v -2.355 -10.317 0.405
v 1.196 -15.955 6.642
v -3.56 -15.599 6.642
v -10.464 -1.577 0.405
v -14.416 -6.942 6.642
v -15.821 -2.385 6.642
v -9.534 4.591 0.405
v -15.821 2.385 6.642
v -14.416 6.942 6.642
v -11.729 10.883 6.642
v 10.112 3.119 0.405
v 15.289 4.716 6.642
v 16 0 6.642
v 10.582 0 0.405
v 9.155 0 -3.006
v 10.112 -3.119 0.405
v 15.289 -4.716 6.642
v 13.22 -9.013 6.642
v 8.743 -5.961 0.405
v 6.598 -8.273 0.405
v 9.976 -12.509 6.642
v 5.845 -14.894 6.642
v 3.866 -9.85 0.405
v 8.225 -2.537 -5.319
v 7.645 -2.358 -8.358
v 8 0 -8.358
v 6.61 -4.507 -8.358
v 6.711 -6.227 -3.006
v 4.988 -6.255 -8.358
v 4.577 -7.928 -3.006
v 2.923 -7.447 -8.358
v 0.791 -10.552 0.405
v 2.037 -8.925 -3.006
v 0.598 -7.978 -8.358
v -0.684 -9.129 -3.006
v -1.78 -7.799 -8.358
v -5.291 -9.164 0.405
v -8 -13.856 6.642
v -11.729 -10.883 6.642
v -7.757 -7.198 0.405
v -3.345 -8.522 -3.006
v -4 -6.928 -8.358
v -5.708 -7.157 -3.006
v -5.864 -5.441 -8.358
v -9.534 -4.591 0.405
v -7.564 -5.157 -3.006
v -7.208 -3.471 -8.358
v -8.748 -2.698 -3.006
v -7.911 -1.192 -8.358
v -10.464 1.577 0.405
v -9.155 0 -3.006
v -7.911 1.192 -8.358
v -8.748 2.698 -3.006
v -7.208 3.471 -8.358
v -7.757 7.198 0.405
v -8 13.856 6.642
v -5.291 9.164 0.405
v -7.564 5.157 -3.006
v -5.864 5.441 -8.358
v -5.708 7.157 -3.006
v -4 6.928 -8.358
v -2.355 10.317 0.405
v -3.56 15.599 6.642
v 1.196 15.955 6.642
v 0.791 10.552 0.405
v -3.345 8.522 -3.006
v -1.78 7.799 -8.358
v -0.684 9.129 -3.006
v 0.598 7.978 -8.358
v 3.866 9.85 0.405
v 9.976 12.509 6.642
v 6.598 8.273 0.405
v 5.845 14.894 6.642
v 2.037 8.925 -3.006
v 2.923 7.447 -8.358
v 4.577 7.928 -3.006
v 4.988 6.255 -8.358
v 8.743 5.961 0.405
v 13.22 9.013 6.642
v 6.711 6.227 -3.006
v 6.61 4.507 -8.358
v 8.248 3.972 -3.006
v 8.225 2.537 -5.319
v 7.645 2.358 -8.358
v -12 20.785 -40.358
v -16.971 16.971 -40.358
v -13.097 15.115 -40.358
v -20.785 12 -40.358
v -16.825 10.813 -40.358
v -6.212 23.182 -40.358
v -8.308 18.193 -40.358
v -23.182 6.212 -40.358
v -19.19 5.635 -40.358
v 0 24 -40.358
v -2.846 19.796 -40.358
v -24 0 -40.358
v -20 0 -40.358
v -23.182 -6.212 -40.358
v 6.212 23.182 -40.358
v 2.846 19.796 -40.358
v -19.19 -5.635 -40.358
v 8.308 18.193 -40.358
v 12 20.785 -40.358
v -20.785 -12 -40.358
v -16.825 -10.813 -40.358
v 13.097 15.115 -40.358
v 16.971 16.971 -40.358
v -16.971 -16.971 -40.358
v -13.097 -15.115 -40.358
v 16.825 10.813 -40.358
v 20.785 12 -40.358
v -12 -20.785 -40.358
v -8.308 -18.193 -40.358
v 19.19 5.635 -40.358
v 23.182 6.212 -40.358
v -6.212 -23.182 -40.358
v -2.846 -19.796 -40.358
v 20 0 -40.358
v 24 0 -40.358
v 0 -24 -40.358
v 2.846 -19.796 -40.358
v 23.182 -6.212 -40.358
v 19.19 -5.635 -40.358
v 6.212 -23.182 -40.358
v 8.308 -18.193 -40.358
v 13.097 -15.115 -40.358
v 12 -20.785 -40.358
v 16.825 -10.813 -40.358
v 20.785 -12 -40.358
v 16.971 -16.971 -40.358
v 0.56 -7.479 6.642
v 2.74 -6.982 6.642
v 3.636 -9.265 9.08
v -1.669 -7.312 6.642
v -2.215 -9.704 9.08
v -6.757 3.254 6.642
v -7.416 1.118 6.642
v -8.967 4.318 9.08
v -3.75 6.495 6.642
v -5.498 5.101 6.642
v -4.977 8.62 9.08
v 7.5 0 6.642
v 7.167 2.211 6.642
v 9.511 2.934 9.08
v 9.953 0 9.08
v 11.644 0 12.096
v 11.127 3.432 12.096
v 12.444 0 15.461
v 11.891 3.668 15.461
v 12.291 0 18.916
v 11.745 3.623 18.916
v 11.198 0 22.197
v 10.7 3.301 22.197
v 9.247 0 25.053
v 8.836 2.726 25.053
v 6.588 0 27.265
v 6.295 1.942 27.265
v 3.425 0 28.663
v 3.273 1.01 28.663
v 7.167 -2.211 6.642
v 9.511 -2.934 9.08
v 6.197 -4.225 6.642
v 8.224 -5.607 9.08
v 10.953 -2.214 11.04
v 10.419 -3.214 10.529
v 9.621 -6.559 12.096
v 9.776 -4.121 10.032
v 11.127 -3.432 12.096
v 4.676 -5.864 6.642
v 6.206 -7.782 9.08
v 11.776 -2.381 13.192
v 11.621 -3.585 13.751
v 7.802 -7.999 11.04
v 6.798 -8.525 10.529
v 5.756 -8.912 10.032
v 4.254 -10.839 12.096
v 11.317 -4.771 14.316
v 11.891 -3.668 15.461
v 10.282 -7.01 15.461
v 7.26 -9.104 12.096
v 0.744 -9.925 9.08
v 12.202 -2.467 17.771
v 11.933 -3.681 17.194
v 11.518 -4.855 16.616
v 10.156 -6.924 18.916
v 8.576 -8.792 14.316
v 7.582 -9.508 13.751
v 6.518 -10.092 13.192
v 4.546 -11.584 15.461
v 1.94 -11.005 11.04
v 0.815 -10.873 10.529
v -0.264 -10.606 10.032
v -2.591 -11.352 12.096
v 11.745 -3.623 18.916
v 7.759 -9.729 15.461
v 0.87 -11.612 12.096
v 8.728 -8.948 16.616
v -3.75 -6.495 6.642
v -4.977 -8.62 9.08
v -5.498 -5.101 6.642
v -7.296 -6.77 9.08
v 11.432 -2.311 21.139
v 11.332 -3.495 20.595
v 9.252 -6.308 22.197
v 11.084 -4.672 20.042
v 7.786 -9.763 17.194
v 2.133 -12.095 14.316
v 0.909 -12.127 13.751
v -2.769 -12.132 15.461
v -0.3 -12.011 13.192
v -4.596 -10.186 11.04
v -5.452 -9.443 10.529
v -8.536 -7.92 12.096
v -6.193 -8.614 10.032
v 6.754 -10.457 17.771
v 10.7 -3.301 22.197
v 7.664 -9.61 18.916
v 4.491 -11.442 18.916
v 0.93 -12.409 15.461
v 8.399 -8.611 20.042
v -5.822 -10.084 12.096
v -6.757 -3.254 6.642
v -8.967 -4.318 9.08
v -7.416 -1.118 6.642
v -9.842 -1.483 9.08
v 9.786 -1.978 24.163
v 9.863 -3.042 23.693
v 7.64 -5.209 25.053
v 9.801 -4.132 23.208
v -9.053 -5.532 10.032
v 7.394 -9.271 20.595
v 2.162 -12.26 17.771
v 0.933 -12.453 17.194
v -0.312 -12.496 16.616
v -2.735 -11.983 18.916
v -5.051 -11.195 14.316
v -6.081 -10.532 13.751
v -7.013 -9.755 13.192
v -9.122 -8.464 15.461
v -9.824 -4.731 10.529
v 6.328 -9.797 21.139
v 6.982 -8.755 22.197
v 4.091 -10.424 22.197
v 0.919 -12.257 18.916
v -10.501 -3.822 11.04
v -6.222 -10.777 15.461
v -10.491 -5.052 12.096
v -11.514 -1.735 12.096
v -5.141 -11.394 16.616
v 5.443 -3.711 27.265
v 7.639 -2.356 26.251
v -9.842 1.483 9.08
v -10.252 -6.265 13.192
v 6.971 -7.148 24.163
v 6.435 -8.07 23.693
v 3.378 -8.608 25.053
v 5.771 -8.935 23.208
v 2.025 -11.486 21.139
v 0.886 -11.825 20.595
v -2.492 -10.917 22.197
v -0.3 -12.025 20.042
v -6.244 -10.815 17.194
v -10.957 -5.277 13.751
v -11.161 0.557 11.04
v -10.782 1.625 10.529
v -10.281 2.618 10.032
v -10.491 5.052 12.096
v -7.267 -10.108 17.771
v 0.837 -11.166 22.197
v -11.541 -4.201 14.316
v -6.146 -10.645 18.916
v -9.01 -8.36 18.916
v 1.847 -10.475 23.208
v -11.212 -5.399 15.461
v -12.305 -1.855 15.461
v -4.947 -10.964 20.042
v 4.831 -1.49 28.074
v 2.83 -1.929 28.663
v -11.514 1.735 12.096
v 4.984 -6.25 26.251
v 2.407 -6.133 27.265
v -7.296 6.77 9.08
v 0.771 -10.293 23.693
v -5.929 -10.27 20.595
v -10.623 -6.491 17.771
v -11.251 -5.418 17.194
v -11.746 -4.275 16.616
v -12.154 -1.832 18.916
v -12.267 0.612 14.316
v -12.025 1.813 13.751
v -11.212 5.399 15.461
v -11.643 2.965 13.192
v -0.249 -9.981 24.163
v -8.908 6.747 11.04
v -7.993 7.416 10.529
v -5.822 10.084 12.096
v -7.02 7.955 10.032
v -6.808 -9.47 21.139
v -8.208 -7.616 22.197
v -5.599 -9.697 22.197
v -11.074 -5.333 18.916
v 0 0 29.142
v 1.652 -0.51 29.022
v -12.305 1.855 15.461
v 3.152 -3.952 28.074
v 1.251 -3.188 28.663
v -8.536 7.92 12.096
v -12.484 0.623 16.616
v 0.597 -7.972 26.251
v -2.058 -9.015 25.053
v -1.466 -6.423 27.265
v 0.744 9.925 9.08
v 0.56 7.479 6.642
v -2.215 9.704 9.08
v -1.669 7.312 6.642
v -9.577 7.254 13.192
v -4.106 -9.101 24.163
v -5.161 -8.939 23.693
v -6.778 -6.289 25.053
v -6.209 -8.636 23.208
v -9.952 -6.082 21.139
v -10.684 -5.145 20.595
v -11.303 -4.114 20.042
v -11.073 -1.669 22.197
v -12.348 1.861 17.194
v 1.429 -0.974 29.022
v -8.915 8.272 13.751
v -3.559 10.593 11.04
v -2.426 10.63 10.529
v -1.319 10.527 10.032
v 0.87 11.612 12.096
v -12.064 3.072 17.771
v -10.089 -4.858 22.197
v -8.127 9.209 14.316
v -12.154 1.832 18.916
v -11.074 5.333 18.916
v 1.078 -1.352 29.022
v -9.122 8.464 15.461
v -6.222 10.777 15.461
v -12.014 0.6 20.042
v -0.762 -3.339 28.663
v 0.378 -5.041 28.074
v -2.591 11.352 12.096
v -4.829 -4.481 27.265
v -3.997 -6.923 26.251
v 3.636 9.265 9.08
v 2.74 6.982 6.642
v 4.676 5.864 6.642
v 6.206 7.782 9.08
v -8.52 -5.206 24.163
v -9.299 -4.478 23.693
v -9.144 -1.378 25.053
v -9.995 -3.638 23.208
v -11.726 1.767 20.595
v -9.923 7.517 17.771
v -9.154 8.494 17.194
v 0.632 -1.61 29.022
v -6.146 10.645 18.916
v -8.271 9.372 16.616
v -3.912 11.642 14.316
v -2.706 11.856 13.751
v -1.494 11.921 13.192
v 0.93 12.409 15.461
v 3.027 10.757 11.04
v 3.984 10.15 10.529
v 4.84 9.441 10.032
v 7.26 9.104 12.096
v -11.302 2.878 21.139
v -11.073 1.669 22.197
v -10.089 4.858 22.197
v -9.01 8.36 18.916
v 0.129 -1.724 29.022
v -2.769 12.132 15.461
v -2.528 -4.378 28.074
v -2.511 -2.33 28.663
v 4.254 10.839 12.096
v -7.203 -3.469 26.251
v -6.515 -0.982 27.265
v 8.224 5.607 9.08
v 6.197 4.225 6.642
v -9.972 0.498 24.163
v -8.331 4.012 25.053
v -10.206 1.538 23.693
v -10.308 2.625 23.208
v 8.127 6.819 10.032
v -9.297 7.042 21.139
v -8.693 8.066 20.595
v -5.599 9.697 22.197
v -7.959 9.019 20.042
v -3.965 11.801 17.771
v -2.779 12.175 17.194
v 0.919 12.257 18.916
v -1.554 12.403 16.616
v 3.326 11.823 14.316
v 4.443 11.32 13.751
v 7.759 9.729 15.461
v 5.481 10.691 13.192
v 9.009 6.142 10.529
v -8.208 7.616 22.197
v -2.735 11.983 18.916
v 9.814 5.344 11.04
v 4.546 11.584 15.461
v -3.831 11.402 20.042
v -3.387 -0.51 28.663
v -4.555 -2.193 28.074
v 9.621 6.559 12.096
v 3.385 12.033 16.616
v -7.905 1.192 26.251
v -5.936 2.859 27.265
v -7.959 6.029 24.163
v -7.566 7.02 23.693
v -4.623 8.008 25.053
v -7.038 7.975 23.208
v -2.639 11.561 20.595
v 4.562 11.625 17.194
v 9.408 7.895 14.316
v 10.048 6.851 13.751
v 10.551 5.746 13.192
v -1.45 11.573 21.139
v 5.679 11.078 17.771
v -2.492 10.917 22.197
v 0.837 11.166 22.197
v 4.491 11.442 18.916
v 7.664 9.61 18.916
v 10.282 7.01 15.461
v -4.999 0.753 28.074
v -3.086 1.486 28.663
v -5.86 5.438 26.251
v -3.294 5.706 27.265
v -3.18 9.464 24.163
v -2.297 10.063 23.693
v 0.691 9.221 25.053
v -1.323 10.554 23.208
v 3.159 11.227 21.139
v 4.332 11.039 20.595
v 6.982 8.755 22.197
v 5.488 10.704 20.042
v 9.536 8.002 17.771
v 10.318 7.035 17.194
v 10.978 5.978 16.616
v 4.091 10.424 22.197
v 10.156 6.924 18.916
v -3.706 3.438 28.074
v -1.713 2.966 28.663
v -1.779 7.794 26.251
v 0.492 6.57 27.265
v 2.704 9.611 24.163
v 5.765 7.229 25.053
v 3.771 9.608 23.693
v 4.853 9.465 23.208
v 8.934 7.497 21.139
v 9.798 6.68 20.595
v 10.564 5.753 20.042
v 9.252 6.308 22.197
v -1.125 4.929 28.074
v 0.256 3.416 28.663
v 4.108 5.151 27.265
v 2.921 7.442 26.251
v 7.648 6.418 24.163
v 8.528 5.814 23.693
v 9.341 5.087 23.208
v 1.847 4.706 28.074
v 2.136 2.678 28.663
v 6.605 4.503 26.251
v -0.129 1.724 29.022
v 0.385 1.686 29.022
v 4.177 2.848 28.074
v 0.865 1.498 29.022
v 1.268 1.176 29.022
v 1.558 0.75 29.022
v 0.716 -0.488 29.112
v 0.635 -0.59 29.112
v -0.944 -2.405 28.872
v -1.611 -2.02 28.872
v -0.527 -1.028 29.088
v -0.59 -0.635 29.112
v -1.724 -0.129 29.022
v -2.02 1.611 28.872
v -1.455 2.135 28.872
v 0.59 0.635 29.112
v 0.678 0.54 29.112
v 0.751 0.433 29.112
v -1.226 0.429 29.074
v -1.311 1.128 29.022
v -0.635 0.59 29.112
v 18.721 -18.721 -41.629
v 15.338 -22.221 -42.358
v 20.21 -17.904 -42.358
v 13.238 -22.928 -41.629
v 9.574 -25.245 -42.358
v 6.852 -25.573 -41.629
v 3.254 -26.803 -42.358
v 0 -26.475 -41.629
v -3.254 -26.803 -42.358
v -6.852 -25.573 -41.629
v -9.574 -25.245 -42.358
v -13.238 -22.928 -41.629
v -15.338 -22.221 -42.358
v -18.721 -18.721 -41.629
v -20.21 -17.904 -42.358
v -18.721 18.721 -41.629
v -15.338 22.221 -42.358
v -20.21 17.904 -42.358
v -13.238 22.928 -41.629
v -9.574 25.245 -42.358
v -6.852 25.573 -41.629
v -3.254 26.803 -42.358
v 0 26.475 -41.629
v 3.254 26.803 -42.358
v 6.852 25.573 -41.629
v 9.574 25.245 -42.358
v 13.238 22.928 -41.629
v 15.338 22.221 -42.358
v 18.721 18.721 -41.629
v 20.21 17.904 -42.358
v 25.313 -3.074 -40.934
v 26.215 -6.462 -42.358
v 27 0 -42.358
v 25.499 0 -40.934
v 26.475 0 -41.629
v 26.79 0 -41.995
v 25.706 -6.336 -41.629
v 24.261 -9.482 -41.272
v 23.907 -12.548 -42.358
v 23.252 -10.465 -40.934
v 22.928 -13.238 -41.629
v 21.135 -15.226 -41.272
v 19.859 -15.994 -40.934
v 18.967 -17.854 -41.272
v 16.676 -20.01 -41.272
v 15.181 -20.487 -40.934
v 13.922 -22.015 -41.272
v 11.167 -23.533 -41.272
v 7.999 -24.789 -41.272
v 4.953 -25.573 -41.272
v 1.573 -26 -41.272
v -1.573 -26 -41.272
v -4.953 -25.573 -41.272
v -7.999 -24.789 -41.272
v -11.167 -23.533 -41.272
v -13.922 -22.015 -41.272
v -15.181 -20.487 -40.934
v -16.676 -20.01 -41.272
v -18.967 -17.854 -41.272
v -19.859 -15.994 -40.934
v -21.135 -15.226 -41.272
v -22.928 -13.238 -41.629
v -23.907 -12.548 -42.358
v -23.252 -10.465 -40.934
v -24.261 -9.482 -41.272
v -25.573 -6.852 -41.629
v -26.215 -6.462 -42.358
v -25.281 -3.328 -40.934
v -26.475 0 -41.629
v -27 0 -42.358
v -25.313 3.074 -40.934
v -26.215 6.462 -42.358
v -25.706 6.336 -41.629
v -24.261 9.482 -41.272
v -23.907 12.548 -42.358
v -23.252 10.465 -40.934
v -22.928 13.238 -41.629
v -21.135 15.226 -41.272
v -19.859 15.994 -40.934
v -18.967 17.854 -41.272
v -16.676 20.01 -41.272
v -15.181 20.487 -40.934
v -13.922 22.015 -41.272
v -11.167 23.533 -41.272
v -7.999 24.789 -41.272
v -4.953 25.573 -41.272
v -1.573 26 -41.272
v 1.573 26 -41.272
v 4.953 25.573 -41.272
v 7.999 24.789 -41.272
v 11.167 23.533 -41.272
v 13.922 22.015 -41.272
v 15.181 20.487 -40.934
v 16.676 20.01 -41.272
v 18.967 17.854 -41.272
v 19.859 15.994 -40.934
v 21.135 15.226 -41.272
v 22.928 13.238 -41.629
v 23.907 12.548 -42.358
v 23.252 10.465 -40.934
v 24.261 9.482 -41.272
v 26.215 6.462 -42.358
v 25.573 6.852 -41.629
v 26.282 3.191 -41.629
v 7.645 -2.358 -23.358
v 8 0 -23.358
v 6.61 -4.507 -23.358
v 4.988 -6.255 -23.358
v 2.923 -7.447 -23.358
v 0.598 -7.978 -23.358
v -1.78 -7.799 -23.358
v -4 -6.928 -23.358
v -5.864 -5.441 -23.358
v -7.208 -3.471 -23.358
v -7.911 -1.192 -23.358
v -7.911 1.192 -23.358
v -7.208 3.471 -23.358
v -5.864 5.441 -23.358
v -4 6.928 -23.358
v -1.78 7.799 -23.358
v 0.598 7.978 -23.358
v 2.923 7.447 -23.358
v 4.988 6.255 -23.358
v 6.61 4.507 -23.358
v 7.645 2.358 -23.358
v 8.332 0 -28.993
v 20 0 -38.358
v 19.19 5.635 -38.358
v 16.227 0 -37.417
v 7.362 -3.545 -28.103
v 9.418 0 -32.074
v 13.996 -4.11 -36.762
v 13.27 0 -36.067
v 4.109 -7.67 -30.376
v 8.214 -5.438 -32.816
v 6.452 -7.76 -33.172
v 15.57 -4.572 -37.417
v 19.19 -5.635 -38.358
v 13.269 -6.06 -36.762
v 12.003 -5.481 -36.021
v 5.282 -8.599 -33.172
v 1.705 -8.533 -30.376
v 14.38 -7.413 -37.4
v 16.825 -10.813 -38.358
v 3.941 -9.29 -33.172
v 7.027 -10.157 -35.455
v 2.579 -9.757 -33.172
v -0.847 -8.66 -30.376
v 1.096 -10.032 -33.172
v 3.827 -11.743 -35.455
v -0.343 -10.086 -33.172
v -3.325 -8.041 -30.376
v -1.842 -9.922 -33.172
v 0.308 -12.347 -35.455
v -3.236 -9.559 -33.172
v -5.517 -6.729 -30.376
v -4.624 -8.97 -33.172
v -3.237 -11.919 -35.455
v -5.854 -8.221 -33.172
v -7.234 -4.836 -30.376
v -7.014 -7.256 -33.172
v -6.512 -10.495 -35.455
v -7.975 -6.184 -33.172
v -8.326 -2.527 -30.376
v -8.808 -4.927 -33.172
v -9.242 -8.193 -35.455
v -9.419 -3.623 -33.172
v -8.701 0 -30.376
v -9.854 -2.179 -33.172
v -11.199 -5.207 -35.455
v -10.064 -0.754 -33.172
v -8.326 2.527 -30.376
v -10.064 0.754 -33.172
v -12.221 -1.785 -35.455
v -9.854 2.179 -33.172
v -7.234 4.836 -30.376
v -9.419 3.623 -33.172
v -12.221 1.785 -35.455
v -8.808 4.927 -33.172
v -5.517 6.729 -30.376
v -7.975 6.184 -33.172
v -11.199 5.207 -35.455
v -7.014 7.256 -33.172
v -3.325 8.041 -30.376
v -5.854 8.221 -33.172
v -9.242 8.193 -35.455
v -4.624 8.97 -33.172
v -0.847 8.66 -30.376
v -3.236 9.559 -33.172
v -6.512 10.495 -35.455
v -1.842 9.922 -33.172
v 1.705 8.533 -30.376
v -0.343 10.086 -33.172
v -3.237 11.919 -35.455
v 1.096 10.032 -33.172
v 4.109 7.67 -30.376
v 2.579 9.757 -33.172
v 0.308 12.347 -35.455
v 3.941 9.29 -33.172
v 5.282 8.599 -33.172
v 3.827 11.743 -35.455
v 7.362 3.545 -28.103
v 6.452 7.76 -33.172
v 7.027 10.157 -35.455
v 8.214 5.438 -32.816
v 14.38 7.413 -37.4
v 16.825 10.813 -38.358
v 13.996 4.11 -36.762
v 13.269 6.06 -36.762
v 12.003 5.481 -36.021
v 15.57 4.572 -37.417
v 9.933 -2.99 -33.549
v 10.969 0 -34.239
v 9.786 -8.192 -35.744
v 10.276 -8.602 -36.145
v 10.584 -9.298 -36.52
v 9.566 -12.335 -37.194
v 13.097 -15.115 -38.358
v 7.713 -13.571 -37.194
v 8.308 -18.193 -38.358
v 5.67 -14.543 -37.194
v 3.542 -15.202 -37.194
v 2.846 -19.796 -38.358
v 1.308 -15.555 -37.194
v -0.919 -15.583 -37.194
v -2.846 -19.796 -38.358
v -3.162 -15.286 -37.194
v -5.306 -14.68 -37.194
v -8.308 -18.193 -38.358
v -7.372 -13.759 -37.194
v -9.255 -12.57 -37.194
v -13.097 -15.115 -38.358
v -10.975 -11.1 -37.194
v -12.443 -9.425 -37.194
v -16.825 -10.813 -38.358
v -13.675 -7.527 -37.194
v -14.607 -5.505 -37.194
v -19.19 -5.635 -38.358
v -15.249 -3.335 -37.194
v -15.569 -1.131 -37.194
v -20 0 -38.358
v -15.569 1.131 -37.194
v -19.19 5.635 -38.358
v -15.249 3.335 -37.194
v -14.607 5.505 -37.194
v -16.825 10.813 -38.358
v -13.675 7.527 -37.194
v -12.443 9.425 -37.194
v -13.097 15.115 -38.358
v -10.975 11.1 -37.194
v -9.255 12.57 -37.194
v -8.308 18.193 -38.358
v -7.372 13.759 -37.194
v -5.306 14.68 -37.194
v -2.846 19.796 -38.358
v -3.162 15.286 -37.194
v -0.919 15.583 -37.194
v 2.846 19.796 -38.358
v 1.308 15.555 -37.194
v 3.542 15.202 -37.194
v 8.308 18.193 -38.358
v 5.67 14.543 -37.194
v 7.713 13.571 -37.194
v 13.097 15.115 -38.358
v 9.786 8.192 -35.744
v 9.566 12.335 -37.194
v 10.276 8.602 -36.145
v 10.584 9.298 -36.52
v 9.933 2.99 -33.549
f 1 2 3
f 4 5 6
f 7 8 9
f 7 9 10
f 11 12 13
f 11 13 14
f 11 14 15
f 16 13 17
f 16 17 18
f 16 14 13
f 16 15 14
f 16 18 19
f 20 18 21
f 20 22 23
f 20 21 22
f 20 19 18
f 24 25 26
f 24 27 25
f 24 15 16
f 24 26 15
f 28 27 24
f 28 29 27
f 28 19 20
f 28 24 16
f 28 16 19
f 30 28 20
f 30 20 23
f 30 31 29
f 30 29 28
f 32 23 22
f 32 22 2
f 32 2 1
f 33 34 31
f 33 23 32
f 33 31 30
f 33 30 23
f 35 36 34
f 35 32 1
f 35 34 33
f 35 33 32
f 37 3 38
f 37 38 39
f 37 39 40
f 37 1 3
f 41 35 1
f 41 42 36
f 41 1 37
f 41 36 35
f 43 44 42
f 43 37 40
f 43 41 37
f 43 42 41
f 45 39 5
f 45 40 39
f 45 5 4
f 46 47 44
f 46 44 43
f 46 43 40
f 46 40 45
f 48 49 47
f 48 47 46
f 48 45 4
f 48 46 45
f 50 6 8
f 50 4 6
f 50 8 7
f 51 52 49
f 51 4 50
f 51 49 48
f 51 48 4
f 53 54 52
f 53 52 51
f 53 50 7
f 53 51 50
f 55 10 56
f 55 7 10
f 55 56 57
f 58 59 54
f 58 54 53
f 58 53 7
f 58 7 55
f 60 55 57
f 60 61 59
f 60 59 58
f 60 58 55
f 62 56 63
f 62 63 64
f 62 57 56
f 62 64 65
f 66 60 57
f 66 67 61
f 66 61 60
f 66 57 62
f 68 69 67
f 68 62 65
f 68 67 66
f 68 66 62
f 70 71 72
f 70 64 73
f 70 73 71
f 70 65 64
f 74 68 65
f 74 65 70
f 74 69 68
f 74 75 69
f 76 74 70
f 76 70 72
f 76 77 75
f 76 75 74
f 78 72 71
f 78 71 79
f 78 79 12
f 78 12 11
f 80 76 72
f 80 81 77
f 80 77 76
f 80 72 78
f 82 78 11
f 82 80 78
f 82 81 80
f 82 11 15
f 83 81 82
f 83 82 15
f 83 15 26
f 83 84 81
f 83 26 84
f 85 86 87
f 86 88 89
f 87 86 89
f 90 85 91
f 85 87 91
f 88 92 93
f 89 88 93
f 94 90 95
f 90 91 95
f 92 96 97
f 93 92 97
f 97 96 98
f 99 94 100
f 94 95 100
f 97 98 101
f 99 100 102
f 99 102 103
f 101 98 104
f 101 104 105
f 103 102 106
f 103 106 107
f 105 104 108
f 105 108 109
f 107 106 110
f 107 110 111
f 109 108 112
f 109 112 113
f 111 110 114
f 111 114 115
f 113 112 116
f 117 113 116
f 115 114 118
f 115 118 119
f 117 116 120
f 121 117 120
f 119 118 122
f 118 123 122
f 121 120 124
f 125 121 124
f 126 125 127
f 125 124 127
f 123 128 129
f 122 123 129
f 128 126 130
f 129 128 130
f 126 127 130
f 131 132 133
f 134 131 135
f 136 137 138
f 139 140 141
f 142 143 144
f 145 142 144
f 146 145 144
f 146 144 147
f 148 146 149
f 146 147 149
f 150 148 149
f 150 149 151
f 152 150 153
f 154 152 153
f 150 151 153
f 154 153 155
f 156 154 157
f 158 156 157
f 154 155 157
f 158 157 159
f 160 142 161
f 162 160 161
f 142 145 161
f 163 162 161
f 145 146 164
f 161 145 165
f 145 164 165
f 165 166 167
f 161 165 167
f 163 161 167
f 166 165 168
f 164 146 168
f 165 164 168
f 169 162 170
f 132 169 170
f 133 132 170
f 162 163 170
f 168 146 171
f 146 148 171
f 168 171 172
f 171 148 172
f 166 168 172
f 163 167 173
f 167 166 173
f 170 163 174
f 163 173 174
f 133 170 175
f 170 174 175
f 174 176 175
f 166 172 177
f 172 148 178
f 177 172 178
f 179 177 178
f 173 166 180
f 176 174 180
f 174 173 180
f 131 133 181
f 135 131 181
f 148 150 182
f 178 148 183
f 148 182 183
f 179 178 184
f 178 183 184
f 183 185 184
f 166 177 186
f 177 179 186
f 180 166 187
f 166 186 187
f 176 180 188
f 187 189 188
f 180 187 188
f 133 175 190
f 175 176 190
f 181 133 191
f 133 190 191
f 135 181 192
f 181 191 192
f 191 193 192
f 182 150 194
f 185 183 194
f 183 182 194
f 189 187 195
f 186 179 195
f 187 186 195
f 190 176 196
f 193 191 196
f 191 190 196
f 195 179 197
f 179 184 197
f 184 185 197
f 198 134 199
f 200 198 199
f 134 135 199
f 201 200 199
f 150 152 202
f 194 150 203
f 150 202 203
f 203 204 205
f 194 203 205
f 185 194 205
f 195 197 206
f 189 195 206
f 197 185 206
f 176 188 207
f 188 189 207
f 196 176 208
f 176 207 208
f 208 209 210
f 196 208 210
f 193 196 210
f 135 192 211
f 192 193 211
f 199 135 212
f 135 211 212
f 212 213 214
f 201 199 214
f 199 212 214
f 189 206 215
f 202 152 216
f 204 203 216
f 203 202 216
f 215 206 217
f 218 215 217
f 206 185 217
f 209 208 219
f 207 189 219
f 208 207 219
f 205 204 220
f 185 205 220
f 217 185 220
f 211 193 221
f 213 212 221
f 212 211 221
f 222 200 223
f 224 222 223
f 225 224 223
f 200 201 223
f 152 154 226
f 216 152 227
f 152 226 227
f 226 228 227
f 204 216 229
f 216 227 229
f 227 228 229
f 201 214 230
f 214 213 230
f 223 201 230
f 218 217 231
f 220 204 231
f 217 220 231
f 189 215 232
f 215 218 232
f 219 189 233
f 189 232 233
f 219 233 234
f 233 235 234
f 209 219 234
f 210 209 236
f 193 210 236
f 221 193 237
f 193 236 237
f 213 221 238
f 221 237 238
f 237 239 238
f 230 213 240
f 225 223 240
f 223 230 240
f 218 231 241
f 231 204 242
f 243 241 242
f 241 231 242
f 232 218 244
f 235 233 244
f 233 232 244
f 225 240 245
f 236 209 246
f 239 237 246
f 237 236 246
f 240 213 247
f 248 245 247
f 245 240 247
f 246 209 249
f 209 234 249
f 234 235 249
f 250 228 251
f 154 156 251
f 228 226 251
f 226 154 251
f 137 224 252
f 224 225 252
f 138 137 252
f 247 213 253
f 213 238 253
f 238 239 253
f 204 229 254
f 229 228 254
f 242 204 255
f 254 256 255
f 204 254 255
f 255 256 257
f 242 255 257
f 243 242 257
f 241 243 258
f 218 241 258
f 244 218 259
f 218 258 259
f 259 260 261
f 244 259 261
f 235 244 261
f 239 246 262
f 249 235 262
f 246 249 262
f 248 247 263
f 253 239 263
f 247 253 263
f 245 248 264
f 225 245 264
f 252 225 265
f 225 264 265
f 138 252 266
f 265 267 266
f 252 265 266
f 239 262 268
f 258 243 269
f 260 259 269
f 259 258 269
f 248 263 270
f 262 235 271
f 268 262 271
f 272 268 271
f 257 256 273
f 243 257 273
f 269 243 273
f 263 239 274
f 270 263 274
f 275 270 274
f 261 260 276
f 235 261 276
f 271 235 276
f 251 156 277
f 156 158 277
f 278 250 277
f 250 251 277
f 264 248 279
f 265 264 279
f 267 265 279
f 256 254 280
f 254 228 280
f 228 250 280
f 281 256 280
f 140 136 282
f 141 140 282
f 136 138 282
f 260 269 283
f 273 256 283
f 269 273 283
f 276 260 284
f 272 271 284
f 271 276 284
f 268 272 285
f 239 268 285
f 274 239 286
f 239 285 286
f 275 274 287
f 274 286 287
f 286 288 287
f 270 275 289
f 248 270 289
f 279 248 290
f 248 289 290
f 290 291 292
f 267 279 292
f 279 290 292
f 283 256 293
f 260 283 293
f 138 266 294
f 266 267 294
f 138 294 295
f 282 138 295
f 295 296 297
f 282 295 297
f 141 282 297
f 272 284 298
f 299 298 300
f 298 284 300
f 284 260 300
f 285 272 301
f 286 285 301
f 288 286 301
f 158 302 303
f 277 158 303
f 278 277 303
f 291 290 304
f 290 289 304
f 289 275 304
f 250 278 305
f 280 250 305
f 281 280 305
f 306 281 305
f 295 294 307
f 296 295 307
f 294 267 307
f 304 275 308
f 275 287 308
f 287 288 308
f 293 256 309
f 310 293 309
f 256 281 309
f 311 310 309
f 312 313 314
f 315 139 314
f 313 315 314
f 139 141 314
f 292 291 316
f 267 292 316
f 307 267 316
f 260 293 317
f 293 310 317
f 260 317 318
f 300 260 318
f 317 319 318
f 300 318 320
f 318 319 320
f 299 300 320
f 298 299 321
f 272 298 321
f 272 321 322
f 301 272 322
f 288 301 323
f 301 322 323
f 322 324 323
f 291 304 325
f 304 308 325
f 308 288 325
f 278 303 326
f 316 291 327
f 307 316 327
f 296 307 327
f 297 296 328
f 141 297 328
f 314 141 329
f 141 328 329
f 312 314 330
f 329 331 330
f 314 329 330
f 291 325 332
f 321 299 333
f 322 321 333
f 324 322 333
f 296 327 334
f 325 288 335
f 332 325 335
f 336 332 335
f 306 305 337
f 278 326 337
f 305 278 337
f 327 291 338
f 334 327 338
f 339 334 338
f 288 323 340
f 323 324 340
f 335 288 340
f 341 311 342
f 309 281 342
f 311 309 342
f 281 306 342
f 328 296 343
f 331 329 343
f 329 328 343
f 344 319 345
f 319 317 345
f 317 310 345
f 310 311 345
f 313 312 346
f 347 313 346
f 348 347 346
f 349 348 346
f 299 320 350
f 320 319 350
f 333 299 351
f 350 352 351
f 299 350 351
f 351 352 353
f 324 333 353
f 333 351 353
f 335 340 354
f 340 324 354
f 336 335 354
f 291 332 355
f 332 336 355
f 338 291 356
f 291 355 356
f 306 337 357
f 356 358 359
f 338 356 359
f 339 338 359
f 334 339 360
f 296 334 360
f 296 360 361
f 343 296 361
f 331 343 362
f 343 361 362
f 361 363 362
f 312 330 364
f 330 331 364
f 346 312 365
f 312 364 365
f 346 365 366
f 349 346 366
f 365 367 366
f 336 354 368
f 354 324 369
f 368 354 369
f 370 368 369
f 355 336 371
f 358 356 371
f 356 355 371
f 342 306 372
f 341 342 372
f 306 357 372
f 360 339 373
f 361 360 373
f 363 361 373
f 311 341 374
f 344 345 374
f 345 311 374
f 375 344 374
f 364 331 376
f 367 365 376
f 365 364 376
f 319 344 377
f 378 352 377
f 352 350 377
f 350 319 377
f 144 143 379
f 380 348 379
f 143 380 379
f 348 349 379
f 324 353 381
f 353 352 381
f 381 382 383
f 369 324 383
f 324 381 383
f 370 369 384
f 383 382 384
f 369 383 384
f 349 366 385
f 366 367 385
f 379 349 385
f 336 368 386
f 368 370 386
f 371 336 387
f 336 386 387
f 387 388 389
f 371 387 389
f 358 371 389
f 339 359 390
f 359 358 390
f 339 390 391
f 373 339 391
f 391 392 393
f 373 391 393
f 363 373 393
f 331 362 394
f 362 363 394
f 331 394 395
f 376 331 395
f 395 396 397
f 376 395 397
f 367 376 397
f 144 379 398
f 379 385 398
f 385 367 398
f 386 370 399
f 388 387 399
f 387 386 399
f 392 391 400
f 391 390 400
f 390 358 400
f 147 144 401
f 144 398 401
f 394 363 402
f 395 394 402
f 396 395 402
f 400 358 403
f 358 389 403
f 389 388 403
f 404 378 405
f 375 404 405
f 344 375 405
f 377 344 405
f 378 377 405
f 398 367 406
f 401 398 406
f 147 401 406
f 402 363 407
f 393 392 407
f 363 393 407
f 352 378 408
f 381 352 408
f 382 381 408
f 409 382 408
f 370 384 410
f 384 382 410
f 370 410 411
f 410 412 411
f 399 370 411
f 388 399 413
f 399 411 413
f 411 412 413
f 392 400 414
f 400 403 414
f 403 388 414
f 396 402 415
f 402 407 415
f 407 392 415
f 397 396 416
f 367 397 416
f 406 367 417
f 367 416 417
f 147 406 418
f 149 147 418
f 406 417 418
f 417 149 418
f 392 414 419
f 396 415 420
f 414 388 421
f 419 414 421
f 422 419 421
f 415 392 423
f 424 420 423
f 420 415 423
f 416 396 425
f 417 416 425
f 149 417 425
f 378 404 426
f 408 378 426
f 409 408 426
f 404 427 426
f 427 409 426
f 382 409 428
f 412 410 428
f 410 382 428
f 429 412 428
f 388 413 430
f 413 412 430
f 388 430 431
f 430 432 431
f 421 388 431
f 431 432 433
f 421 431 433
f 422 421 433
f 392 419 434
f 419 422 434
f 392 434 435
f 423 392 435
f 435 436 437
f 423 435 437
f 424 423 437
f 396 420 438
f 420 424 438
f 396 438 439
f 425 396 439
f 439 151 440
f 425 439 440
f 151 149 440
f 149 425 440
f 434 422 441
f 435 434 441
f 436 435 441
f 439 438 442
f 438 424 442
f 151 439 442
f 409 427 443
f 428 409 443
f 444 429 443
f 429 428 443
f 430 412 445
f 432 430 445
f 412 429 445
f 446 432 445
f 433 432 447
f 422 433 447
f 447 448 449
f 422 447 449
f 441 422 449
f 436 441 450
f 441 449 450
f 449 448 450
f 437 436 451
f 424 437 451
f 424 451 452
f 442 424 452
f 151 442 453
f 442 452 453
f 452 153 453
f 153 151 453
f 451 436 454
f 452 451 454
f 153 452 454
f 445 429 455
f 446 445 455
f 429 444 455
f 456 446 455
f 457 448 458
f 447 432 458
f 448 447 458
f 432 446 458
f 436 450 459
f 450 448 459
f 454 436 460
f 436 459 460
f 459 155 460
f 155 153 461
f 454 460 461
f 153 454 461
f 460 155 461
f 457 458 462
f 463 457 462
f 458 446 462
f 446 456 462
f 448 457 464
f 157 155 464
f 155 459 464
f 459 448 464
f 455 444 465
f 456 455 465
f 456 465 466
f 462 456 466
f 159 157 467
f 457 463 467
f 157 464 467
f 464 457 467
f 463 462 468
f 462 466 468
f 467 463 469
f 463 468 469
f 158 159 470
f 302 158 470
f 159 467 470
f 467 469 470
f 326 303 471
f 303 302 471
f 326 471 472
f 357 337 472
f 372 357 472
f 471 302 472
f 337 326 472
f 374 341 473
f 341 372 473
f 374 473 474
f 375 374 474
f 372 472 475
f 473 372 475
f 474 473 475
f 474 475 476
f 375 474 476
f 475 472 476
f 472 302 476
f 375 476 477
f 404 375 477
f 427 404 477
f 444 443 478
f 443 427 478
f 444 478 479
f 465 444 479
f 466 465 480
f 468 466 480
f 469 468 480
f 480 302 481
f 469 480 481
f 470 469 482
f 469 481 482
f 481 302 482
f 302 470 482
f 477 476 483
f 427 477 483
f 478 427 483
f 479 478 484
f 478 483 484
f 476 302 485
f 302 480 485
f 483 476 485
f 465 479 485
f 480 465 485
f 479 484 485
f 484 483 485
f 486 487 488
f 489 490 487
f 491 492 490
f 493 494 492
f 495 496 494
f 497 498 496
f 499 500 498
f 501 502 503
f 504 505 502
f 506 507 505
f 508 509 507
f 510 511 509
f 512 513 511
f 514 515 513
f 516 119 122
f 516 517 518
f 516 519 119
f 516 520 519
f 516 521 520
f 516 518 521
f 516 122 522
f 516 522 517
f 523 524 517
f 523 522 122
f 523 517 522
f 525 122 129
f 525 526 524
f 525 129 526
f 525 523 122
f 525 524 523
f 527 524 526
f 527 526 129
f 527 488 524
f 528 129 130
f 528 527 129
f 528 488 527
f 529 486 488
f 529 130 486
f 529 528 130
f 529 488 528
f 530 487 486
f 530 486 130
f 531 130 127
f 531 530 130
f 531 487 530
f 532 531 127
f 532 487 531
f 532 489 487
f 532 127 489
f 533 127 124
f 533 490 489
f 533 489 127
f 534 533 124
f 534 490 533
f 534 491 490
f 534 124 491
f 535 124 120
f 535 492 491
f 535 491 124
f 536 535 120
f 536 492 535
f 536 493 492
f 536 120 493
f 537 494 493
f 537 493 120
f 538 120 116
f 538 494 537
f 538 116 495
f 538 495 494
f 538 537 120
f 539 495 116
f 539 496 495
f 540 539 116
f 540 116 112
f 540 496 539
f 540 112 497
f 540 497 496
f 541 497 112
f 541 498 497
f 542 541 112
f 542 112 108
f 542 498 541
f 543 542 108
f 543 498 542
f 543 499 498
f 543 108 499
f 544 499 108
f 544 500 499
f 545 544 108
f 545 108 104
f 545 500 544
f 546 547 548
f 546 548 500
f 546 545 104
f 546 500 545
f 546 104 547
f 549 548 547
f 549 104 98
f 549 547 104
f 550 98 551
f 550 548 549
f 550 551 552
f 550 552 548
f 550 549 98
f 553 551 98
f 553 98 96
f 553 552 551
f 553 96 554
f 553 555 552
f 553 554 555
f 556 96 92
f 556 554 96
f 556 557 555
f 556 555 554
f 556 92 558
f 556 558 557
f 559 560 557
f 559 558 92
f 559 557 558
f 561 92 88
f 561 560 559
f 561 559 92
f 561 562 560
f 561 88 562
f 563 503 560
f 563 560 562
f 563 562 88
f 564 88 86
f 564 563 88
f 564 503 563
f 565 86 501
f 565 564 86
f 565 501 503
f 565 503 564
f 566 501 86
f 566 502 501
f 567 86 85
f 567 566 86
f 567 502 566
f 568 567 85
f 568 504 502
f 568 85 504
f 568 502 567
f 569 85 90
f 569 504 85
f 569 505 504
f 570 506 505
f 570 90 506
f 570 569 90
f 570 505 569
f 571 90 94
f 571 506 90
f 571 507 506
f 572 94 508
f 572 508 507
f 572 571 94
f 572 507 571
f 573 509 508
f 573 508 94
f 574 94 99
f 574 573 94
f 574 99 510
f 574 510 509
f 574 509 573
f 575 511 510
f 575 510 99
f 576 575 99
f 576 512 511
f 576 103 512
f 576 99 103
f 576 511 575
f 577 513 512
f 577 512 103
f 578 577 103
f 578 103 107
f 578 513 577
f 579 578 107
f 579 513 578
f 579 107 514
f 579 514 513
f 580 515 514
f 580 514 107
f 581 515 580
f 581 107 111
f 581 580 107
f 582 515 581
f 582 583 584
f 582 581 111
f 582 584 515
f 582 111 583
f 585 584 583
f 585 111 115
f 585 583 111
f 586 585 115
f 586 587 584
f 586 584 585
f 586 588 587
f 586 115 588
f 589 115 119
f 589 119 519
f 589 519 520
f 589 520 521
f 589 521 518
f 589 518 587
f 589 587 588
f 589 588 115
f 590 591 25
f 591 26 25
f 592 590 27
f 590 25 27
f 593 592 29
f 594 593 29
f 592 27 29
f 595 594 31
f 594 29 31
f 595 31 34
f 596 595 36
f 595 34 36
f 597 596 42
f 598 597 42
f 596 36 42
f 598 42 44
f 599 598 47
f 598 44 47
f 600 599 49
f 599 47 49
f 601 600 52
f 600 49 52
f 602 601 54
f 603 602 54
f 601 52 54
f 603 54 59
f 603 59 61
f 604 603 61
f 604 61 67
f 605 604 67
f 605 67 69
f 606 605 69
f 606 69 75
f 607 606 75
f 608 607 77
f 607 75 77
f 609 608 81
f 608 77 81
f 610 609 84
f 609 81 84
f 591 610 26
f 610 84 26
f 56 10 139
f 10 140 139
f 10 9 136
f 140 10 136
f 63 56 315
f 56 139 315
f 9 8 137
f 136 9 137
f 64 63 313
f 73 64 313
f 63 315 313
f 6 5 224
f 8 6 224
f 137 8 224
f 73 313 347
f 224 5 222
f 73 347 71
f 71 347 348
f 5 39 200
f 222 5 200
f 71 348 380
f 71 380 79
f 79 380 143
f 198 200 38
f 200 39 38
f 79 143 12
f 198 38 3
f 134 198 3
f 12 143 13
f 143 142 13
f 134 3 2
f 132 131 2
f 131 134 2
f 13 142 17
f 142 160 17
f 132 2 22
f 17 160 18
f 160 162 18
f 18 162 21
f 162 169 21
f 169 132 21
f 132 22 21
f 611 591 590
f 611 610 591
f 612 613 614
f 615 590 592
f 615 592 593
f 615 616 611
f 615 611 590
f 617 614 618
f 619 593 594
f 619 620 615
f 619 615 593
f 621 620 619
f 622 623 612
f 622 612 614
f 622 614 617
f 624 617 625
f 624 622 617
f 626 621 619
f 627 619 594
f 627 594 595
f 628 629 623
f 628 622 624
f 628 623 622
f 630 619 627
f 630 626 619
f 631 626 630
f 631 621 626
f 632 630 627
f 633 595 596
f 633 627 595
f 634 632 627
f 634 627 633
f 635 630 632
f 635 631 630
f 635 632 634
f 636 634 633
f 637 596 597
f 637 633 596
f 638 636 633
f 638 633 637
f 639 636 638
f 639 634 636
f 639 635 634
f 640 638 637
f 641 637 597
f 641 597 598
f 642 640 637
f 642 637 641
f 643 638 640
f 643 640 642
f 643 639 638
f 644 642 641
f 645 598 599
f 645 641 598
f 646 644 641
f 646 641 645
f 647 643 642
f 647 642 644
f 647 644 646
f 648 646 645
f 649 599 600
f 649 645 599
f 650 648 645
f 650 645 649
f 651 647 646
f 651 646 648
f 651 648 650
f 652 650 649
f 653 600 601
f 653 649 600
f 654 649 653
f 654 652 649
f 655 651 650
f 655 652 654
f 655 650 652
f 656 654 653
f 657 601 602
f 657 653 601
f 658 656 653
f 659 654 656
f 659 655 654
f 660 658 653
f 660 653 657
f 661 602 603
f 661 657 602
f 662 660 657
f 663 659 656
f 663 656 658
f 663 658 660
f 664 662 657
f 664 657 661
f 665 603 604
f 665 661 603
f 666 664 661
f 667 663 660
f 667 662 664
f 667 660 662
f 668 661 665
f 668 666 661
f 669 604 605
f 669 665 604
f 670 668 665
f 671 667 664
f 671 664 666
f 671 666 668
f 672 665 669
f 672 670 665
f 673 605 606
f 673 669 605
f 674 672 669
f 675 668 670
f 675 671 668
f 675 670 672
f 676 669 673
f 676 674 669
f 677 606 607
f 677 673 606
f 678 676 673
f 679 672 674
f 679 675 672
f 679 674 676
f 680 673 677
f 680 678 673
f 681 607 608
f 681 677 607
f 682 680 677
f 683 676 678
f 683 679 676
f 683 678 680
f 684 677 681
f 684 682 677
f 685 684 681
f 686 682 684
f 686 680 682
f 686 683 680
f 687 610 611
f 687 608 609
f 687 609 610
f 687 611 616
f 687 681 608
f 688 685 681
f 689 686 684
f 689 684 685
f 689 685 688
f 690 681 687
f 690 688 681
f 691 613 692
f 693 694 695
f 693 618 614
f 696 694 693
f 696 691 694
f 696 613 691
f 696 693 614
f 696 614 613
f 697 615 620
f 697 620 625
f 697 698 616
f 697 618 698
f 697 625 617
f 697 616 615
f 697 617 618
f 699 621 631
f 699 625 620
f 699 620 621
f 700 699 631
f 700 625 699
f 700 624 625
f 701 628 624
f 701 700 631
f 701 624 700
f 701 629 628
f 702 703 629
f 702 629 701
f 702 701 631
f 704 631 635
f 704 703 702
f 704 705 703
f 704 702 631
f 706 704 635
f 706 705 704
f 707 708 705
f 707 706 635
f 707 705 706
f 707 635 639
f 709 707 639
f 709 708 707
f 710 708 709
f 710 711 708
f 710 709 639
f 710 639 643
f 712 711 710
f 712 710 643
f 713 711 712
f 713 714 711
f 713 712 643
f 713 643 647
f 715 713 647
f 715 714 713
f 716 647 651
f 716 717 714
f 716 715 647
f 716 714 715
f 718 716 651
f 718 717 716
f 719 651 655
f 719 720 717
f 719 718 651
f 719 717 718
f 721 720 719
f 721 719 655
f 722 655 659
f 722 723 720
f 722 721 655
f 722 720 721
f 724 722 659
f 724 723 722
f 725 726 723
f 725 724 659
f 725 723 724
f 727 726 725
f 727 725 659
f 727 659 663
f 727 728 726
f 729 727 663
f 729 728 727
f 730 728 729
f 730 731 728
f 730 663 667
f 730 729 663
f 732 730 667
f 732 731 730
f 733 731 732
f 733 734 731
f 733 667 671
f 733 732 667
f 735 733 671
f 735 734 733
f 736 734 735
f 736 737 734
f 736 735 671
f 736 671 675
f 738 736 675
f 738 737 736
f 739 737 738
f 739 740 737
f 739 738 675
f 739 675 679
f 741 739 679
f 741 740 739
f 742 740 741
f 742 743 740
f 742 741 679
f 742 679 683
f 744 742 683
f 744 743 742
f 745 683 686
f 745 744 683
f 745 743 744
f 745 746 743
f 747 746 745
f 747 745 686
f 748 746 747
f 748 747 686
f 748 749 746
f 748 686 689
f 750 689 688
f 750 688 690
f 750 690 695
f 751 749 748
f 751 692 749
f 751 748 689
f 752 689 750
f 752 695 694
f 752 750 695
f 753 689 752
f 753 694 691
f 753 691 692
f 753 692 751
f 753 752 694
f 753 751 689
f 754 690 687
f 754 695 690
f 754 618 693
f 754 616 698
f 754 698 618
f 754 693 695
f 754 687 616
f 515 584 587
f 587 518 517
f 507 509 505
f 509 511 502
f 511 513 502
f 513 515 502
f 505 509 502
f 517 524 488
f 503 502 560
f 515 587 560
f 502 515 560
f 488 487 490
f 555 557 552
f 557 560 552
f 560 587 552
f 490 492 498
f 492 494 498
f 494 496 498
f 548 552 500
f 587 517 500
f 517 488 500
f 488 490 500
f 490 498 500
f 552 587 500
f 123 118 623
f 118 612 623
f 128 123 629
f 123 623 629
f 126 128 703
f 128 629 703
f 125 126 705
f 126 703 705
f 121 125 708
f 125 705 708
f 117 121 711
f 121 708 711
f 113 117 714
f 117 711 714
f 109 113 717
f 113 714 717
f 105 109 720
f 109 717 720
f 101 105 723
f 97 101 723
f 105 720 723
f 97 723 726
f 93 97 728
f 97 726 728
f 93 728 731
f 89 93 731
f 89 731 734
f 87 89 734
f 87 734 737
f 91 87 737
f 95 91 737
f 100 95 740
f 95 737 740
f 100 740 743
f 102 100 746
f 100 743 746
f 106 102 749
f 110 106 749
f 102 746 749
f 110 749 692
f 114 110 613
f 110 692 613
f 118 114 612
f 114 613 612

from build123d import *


with BuildPart() as f1:
    # F0 (on Front) → F1 (revolve)
    with BuildSketch(Plane.XZ):
        with BuildLine():
            Line((16, 6.641762), (7.5, 6.641762))
            ThreePointArc((7.5, 6.641762), (11.858541, 20.594609), (0, 29.141762))
            Line((0, 29.141762), (0, 16.641762))
            Line((0, 16.641762), (0, 6.641762))
            Line((0, 6.641762), (0, -8.358238))
            Line((0, -8.358238), (0, -23.358238))
            Line((0, -23.358238), (0, -38.358238))
            Line((0, -38.358238), (0, -40.358238))
            Line((0, -40.358238), (0, -42.358238))
            Line((0, -42.358238), (27, -42.358238))
            add(Edge.make_bspline(
                [(24, -40.358238), (25.783967, -40.846817), (26.677305, -41.640896), (27, -42.358238)],
                knots=[0, 0, 0, 0, 3.605551, 3.605551, 3.605551, 3.605551], degree=3))
            Line((24, -40.358238), (20, -40.358238))
            Line((20, -40.358238), (20, -38.358238))
            add(Edge.make_bspline(
                [(8, -23.358238), (7.57825, -31.265218), (10, -36.622424), (20, -38.358238)],
                knots=[0, 0, 0, 0, 19.209373, 19.209373, 19.209373, 19.209373], degree=3))
            Line((8, -23.358238), (8, -8.358238))
            add(Edge.make_bspline(
                [(16, 6.641762), (9.63382, 0), (9.63382, 0), (8, -8.358238)],
                knots=[0, 0, 0, 0, 17, 17, 17, 17], degree=3))
        make_face()
    revolve(axis=Axis((0, 0, 22.891762), (0, 0, -1)))


solid = f1.part
